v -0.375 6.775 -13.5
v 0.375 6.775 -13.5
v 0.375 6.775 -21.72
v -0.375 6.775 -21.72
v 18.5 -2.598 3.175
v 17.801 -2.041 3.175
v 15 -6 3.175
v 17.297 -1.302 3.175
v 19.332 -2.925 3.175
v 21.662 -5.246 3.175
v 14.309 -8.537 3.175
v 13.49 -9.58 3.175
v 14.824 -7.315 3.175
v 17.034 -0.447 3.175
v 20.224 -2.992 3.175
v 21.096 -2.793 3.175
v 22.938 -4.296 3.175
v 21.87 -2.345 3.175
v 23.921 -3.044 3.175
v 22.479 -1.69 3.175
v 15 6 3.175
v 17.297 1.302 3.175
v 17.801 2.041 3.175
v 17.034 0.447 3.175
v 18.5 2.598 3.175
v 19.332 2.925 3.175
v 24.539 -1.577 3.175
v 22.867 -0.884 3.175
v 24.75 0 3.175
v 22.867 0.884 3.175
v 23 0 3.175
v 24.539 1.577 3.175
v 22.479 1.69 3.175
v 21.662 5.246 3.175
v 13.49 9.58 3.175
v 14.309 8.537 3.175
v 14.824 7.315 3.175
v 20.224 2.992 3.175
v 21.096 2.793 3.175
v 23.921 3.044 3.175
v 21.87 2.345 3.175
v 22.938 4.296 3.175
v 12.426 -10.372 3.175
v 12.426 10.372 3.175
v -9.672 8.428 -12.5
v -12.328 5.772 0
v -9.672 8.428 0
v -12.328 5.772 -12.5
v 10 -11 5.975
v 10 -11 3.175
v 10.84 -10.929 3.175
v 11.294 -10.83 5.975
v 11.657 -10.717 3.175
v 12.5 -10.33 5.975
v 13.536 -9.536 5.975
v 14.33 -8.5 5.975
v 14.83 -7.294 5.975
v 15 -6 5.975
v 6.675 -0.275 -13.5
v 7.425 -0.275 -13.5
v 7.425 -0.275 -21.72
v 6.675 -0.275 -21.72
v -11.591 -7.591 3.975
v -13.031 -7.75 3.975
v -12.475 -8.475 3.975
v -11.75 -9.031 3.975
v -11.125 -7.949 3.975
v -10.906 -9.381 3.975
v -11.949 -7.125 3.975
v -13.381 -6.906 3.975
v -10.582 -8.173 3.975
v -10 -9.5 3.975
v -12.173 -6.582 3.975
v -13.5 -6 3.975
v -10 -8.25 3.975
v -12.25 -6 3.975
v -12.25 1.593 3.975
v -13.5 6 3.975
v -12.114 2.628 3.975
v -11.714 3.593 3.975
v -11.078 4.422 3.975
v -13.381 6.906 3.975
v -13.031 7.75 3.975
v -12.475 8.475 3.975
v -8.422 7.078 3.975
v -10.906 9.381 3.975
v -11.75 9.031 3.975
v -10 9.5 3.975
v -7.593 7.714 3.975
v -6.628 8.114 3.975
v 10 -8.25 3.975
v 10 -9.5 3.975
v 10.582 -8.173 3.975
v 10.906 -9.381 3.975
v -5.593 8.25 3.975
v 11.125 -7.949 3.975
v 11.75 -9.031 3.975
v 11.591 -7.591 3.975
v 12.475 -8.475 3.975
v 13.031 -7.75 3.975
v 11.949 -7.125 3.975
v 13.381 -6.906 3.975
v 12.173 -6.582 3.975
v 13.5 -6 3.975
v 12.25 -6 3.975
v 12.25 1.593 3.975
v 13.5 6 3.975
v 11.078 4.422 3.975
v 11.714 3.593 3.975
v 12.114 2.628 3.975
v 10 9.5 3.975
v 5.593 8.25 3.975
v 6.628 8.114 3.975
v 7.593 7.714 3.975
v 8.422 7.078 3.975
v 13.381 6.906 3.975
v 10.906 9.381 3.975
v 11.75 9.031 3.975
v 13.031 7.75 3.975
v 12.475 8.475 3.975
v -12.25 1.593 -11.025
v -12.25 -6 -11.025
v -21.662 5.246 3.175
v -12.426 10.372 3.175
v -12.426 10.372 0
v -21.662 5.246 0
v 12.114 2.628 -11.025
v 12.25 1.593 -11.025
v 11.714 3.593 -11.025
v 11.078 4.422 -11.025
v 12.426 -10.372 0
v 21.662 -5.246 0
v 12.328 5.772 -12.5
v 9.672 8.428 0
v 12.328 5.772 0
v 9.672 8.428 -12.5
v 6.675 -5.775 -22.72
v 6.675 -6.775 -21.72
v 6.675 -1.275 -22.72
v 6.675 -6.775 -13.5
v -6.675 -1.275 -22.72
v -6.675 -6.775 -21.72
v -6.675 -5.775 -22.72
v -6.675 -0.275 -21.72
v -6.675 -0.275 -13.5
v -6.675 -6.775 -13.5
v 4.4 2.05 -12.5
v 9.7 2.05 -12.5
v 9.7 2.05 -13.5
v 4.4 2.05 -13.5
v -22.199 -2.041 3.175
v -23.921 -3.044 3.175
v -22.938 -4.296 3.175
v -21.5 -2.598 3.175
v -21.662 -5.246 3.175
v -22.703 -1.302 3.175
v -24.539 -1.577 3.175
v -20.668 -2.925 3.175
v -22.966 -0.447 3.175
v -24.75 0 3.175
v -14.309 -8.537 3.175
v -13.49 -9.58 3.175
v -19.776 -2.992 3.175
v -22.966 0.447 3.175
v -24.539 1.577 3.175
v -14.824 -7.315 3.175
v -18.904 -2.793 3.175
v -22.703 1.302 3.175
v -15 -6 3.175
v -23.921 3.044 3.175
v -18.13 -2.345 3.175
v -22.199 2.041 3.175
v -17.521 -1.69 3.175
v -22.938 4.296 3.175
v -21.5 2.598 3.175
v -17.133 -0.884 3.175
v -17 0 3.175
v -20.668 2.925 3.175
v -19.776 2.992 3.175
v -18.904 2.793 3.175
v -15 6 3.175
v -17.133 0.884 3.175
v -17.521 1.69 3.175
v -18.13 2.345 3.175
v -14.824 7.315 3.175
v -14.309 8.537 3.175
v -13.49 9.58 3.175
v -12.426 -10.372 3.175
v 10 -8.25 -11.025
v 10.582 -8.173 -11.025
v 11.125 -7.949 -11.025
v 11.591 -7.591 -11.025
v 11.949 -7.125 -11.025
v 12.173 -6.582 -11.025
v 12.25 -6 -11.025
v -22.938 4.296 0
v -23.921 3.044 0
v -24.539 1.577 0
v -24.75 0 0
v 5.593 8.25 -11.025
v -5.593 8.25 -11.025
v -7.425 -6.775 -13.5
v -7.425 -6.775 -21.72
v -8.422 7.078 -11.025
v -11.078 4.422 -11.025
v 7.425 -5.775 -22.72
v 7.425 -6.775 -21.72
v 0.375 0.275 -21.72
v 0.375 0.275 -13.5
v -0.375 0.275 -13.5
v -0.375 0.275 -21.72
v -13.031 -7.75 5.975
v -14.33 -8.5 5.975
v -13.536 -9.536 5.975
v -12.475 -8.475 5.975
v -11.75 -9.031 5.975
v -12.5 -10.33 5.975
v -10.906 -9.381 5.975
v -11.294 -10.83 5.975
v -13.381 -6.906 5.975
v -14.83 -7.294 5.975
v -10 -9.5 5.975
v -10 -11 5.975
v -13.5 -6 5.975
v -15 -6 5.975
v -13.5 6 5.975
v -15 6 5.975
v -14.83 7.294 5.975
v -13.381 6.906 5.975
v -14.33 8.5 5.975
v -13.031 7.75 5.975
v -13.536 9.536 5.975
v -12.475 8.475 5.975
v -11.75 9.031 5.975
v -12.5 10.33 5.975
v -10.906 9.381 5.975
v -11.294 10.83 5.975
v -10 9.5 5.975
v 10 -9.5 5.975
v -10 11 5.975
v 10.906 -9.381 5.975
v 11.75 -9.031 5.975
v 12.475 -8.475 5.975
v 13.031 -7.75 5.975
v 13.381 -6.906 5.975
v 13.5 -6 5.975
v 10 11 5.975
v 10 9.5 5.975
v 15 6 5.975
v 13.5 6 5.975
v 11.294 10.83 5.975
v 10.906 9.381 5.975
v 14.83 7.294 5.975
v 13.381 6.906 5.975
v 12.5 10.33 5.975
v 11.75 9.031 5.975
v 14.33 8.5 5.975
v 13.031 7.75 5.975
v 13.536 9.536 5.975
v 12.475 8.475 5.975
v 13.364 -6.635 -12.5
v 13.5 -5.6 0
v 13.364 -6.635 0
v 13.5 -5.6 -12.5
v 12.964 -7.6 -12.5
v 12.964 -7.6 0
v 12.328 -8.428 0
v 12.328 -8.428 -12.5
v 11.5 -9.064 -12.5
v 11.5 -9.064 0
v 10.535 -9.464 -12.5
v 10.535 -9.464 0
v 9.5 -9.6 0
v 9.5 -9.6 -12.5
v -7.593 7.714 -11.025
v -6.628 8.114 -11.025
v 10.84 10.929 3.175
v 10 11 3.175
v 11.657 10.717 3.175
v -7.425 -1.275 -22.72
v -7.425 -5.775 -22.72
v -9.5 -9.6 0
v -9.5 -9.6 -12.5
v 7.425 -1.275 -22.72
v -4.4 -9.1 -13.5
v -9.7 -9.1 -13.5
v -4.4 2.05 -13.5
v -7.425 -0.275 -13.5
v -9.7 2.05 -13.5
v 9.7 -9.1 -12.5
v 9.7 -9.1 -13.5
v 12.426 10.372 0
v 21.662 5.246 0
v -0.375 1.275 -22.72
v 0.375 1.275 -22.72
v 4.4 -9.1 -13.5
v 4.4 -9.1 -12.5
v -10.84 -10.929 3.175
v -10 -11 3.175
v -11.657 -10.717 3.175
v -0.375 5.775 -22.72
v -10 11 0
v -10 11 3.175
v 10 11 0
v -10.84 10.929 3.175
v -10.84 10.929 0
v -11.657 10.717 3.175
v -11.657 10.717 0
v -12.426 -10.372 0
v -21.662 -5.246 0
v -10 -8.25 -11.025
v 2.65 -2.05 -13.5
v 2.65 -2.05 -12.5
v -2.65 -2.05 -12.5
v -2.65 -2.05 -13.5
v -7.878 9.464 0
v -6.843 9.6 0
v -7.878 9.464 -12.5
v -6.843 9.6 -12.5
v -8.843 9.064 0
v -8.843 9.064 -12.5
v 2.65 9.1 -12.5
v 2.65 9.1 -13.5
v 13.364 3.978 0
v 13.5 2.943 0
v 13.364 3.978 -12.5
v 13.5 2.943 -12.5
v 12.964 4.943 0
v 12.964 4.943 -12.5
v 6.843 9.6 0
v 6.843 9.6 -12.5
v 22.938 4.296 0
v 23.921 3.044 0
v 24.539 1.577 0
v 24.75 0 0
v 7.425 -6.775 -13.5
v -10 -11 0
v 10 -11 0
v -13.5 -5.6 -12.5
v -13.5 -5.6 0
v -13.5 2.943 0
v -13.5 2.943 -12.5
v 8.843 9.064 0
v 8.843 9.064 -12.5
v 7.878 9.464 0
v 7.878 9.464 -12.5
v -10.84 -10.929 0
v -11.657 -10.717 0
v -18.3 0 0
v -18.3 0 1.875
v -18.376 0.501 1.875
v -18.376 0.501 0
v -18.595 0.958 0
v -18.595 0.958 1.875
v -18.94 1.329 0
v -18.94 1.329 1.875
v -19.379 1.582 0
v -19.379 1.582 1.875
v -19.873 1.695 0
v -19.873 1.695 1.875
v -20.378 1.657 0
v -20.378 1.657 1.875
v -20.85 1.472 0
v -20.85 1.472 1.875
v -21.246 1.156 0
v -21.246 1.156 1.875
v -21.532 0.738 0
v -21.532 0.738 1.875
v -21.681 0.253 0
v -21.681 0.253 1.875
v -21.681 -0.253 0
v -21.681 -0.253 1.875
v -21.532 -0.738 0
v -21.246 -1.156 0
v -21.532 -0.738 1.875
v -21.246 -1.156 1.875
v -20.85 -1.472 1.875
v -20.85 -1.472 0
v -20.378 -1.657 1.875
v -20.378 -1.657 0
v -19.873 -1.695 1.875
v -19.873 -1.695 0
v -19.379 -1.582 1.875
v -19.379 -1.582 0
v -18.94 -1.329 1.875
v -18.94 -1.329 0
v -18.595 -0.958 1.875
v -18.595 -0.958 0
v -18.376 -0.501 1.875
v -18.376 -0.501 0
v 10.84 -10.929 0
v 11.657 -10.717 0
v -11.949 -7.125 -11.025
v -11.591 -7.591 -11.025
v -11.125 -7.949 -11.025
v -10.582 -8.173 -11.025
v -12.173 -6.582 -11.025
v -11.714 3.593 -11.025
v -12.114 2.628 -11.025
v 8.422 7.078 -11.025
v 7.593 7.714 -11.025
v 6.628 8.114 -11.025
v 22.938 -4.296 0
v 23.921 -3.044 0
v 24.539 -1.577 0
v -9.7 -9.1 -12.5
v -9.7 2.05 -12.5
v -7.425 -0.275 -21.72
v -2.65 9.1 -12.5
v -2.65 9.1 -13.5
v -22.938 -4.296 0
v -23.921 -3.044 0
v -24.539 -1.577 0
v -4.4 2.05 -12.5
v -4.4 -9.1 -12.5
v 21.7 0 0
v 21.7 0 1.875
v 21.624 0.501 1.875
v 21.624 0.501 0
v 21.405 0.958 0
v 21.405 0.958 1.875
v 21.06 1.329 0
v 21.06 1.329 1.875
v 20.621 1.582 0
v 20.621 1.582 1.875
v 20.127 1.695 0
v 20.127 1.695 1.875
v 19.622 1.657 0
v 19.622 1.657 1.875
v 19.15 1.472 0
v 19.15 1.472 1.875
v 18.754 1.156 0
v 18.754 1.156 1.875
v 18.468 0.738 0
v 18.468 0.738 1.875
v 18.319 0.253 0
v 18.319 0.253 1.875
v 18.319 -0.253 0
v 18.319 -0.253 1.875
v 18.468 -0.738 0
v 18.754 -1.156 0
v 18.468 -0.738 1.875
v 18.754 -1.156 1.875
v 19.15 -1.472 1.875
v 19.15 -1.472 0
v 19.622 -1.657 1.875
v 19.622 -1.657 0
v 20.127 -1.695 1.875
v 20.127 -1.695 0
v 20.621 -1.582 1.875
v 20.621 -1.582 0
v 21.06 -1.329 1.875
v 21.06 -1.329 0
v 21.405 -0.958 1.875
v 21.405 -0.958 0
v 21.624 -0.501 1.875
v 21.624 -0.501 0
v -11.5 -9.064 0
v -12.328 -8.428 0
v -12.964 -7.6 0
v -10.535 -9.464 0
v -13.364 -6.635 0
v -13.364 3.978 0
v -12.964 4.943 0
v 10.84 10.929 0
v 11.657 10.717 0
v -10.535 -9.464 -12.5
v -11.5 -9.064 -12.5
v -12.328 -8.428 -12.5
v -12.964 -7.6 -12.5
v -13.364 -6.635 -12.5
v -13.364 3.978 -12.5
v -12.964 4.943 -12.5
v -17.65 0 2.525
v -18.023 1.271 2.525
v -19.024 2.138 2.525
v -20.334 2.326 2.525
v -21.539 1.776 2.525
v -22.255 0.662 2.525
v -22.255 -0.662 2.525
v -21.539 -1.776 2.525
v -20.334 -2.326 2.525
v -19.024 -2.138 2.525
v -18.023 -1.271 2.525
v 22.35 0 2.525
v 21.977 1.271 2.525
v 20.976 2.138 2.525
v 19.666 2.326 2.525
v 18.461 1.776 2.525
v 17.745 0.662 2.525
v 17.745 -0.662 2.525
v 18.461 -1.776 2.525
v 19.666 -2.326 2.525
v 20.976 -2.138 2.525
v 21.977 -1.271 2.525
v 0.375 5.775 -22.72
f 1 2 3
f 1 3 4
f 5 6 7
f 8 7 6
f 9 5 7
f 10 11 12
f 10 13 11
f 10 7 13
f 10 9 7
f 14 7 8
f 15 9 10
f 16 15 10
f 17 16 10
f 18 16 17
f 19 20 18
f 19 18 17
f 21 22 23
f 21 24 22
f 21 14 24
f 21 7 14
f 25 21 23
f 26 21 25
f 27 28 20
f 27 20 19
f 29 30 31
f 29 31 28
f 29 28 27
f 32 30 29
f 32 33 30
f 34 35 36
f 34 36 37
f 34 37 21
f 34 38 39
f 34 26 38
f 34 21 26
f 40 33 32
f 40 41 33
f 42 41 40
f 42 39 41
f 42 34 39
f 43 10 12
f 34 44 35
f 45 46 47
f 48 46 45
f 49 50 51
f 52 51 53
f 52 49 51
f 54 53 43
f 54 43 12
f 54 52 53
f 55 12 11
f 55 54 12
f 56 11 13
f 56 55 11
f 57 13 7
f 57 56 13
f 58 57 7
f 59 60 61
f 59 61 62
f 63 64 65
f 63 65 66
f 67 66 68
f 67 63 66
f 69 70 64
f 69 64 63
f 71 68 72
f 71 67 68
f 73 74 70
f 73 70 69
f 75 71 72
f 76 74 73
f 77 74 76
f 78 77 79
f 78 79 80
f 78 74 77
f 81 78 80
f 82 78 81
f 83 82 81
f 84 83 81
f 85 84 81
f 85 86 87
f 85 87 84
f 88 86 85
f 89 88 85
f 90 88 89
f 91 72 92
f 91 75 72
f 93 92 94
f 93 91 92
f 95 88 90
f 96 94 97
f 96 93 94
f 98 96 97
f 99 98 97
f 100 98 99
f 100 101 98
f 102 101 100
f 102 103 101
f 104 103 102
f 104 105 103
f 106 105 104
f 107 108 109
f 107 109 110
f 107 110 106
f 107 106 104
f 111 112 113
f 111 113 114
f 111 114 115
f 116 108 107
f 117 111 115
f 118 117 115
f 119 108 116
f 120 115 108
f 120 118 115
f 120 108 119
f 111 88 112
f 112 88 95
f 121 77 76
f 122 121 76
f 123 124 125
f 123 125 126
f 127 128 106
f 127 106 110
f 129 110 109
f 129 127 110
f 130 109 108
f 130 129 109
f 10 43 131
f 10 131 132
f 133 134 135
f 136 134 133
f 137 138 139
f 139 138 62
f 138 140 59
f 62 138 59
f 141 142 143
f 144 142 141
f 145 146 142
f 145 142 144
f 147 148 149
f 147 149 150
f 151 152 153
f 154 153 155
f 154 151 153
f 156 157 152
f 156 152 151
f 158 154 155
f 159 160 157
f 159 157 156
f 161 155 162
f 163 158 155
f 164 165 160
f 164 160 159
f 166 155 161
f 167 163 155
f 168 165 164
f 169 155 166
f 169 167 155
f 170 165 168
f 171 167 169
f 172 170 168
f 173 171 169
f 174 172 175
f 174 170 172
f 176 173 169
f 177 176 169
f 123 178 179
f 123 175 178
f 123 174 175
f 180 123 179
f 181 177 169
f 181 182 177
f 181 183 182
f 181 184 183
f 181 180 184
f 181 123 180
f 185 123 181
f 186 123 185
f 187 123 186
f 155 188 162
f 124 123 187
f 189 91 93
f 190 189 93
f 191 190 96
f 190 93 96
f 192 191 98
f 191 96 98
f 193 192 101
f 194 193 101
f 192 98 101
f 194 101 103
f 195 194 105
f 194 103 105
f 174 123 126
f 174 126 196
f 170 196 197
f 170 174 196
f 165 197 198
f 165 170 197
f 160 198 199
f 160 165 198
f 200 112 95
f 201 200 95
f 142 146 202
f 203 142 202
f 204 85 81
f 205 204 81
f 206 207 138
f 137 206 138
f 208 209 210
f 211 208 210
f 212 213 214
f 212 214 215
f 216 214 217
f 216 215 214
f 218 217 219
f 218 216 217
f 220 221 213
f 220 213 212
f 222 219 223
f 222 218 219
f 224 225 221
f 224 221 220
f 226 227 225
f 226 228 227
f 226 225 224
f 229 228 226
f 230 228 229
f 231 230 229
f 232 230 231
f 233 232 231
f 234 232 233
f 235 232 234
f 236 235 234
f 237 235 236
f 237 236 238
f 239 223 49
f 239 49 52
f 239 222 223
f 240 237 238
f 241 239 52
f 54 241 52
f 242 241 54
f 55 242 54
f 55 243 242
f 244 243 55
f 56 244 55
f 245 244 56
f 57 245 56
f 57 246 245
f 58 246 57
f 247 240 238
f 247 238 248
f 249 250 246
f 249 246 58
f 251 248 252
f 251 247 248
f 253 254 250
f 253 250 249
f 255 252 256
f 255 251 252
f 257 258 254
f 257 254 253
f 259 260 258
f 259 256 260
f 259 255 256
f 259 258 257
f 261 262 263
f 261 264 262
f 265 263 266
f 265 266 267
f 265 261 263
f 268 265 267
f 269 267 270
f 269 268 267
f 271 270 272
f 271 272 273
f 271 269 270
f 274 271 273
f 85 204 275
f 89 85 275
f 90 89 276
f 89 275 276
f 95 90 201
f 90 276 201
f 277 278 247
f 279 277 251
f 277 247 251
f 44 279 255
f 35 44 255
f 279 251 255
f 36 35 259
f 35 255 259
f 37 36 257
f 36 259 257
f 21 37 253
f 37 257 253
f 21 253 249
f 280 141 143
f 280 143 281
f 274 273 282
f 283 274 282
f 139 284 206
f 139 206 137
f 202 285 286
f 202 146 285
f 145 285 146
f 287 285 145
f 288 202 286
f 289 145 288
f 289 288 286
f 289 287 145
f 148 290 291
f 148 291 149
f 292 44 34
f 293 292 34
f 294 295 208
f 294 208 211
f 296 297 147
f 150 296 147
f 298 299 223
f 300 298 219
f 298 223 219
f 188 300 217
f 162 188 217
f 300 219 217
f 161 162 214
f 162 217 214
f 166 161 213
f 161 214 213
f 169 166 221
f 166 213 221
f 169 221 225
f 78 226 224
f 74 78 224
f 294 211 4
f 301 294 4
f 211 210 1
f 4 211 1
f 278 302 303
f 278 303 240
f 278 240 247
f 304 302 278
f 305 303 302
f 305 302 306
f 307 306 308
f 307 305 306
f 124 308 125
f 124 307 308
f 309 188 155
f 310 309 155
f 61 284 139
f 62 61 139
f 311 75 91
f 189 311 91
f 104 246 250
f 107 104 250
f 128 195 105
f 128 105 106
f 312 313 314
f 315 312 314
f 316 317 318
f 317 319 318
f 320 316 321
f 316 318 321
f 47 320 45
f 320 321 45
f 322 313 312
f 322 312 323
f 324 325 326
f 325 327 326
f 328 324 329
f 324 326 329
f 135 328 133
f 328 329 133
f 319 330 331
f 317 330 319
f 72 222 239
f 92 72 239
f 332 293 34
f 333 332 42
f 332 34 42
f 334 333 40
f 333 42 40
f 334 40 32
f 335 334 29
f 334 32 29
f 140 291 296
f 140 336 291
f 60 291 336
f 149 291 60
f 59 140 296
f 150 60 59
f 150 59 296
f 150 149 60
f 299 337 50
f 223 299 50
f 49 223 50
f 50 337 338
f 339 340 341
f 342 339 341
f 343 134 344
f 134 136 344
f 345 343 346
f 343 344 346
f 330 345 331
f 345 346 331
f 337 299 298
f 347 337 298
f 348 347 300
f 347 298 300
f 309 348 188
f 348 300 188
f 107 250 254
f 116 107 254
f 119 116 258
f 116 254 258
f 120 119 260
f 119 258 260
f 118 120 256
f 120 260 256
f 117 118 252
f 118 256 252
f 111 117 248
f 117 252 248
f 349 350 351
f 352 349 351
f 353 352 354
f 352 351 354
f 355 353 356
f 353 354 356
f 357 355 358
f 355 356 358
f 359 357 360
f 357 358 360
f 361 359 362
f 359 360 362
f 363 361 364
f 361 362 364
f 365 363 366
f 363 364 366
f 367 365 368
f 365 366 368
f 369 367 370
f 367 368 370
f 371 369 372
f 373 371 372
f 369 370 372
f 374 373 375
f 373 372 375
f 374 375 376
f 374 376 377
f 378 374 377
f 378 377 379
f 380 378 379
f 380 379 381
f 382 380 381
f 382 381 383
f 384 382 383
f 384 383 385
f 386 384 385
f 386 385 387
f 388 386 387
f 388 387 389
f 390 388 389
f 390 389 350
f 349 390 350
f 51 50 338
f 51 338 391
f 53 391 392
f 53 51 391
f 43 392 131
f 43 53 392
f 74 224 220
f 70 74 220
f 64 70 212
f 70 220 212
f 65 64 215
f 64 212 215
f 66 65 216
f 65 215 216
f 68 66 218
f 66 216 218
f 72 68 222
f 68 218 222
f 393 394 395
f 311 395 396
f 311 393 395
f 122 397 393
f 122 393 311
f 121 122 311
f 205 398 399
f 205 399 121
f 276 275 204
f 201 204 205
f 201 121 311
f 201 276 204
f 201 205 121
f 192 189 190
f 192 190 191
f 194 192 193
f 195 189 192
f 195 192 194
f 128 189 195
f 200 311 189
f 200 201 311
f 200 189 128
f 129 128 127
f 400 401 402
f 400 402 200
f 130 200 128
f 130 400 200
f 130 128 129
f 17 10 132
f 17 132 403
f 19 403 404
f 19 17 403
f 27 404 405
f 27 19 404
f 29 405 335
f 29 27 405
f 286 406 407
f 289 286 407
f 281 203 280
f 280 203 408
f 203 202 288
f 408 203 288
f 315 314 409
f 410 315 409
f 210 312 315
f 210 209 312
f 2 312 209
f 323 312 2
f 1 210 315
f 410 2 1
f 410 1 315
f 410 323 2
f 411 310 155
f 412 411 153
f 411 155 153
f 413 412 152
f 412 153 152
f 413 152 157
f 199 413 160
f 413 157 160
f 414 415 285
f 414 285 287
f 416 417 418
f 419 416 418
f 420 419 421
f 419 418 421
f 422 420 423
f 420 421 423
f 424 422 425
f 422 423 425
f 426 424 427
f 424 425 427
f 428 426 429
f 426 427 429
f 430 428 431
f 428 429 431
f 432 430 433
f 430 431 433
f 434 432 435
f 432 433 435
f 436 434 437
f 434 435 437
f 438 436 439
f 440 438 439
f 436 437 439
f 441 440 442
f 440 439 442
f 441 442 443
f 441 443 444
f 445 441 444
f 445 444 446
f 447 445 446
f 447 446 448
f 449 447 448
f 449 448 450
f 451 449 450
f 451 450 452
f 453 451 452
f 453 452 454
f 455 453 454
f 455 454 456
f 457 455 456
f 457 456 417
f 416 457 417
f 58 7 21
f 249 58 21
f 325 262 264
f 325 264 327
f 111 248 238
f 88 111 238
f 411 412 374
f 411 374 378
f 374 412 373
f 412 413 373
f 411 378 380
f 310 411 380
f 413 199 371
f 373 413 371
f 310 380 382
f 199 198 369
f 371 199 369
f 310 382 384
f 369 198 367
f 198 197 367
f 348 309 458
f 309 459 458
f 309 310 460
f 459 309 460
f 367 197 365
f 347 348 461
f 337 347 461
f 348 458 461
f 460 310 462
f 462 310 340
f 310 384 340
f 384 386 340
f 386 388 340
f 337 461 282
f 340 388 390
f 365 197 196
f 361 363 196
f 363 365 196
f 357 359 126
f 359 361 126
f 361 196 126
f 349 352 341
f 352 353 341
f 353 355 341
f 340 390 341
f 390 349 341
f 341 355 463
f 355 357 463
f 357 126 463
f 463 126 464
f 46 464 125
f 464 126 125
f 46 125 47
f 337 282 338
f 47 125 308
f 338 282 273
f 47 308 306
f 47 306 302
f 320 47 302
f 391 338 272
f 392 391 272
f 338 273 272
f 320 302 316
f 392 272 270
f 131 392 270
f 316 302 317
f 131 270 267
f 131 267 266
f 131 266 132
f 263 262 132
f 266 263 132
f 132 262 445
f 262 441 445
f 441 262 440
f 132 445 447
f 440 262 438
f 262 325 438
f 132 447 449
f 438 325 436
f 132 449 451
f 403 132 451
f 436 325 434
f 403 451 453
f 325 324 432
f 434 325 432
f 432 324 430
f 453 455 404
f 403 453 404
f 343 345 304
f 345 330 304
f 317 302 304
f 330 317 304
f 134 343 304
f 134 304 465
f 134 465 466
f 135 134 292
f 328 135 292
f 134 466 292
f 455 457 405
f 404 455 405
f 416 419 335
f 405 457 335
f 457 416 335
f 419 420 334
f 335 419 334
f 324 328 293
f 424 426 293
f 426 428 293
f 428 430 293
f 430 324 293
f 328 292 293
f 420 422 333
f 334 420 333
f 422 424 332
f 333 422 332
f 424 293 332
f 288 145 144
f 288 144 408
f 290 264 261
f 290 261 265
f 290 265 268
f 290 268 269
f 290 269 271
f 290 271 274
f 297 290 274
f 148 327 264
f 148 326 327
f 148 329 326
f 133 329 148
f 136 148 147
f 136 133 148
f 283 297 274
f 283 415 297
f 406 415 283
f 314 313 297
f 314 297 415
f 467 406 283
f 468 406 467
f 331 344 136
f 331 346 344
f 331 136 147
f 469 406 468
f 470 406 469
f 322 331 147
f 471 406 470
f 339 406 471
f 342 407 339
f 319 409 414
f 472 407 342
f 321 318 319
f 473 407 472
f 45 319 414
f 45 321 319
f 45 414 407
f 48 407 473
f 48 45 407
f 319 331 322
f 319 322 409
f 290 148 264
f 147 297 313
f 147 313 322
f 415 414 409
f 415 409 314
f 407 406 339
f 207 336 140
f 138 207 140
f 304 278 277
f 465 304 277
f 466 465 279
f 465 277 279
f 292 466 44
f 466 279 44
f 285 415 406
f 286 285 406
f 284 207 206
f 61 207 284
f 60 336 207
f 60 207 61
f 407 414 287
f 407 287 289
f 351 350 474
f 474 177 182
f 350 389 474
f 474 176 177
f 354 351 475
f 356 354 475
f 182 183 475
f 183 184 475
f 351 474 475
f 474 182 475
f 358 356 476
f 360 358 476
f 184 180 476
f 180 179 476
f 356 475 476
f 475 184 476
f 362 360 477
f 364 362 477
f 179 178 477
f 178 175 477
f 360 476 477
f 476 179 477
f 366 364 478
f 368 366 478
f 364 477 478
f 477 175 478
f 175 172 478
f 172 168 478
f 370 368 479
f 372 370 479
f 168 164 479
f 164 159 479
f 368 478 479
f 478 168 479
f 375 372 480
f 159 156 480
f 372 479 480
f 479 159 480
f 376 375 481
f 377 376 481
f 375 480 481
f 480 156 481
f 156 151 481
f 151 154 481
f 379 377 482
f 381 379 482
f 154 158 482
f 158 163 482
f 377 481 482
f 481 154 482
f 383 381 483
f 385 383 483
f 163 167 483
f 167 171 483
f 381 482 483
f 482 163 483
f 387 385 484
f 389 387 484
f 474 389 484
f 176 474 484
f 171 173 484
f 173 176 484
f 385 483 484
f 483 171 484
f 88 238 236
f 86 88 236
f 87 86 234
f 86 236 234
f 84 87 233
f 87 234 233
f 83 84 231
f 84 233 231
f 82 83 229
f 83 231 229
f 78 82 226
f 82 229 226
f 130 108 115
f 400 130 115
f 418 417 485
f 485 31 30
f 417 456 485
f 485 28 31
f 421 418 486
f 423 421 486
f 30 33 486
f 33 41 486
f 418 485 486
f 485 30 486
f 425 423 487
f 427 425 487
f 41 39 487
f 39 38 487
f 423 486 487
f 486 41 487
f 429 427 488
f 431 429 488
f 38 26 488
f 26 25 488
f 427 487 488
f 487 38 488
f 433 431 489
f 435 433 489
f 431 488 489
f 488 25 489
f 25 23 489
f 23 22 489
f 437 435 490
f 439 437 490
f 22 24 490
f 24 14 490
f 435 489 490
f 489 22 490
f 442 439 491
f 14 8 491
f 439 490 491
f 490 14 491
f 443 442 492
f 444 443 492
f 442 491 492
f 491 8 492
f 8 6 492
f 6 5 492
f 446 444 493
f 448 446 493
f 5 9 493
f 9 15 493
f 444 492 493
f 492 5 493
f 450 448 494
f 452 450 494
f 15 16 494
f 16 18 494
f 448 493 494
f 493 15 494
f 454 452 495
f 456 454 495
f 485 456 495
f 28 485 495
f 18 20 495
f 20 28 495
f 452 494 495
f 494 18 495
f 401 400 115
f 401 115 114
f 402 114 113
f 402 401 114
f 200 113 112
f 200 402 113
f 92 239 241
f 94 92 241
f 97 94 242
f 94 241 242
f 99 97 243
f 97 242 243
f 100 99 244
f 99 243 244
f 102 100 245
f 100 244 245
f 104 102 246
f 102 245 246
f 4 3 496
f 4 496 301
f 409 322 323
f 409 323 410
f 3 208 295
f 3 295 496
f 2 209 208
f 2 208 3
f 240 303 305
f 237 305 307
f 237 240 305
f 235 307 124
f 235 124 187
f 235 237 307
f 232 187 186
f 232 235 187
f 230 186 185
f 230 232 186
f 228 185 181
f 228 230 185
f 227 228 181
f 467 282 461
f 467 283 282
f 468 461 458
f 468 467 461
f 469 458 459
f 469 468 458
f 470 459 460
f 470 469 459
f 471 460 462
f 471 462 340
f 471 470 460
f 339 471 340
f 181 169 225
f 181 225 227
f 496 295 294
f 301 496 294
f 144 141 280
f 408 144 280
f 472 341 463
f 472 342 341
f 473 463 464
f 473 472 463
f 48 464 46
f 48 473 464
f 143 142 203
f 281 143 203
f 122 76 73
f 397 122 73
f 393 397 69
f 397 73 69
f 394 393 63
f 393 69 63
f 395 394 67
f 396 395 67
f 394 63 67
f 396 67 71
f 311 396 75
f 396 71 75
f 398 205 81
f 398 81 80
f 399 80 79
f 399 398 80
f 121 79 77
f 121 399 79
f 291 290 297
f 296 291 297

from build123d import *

# Parameters (mm, degrees)
SKETCH1_W            = 49.5
SKETCH1_H            = 22
BOSS_EXTRUDE1_DEPTH  = 3.175
SKETCH2_W            = 30
SKETCH2_H            = 22
BOSS_EXTRUDE2_DEPTH  = 2.8
FILLET1_R            = 5
SKETCH4_W            = 27
SKETCH4_H            = 19.2
BOSS_EXTRUDE3_DEPTH  = 12.5
CHAMFER1_SIZE        = 5
FILLET2_R            = 4
SKETCH3_R            = 1.7
CUT_EXTRUDE1_DEPTH   = 16.675
CUT_EXTRUDE2_DEPTH   = 16.2
MIRROR2_COPY_1_DEPTH = 16.2
CHAMFER2_SIZE        = 1.3
CUT_EXTRUDE4_DEPTH   = 17
FILLET3_R            = 4
SKETCH9_W            = 5.3
SKETCH9_H            = 11.15
BOSS_EXTRUDE4_DEPTH  = 1
SKETCH10_W           = 0.75
SKETCH10_H           = 6.5
BOSS_EXTRUDE5_DEPTH  = 9.22
CHAMFER3_SIZE        = 1
CUT_EXTRUDE3_DEPTH   = 2


with BuildPart() as part:
    # Sketch1 → Boss-Extrude1 (new body)
    with BuildSketch(Plane.XY):
        Rectangle(SKETCH1_W, SKETCH1_H)
    extrude(amount=BOSS_EXTRUDE1_DEPTH)

    # Sketch2 → Boss-Extrude2 (add)
    with BuildSketch(Plane.XY.offset(3.175)):
        Rectangle(SKETCH2_W, SKETCH2_H)
    extrude(amount=BOSS_EXTRUDE2_DEPTH)

    # Fillet1
    fillet1_edges = [part.edges().sort_by_distance(p)[0] for p in [
        (-15, 11, 4.575),
        (15, 11, 4.575),
        (15, -11, 4.575),
        (-15, -11, 4.575),
    ]]
    fillet(fillet1_edges, radius=FILLET1_R)

    # Sketch4 → Boss-Extrude3 (add)
    with BuildSketch(Plane(origin=(0, 0, 0), x_dir=(-1, 0, 0), z_dir=(0, 0, -1))):
        Rectangle(SKETCH4_W, SKETCH4_H)
    extrude(amount=BOSS_EXTRUDE3_DEPTH)

    # Chamfer1
    chamfer1_edges = [part.edges().sort_by_distance(p)[0] for p in [
        (13.5, 9.6, -6.25),
        (-13.5, 9.6, -6.25),
    ]]
    chamfer(chamfer1_edges, length=CHAMFER1_SIZE)

    # Fillet2
    fillet2_edges = [part.edges().sort_by_distance(p)[0] for p in [
        (13.5, -9.6, -6.25),
        (-13.5, -9.6, -6.25),
        (8.5, 9.6, -6.25),
        (-8.5, 9.6, -6.25),
        (-13.5, 4.6, -6.25),
        (13.5, 4.6, -6.25),
    ]]
    fillet(fillet2_edges, radius=FILLET2_R)

    # Sketch3 → Cut-Extrude1 (cut, through all)
    with BuildSketch(Plane.XY.offset(3.175)):
        with Locations((-20, 0)):
            Circle(SKETCH3_R)
        with Locations((20, 0)):
            Circle(SKETCH3_R)
    extrude(amount=-CUT_EXTRUDE1_DEPTH, mode=Mode.SUBTRACT)

    # Sketch5 → Cut-Extrude2 (cut)
    with BuildSketch(Plane.XY.offset(3.175)):
        with BuildLine():
            Line((-12.426380479, 10.371804865), (-21.661656574, 5.246165837))
            ThreePointArc((-21.661656574, 5.246165837), (-23.92058698, 3.043851225), (-24.75, 0))
            Line((-24.75, 0), (-24.75, 11))
            Line((-24.75, 11), (-10, 11))
            ThreePointArc((-10, 11), (-11.253191062, 10.840404132), (-12.426380479, 10.371804865))
        make_face()
    cut_extrude2 = extrude(amount=-CUT_EXTRUDE2_DEPTH, mode=Mode.SUBTRACT)

    # Mirror1: Cut-Extrude2 across plane
    add(cut_extrude2.mirror(Plane.ZX), mode=Mode.SUBTRACT)

    # Mirror2: Cut-Extrude2 across plane
    add(cut_extrude2.mirror(Plane(origin=(0, 0, 0), x_dir=(0, 0, 1), z_dir=(1, 0, 0))), mode=Mode.SUBTRACT)

    # Mirror2 copy 1 sketch → Mirror2 copy 1 (cut)
    with BuildSketch(Plane(origin=(0, 0, 3.175), x_dir=(-1, 0, 0), z_dir=(0, 0, 1))):
        with BuildLine():
            Line((-12.426380479, 10.371804865), (-21.661656574, 5.246165837))
            ThreePointArc((-21.661656574, 5.246165837), (-23.92058698, 3.043851225), (-24.75, 0))
            Line((-24.75, 0), (-24.75, 11))
            Line((-24.75, 11), (-10, 11))
            ThreePointArc((-10, 11), (-11.253191062, 10.840404132), (-12.426380479, 10.371804865))
        make_face()
    extrude(amount=-MIRROR2_COPY_1_DEPTH, mode=Mode.SUBTRACT)

    # Chamfer2
    chamfer2_edges = [part.edges().sort_by_distance(p)[0] for p in [
        (-21.7, 0, 3.175),
        (18.3, 0, 3.175),
    ]]
    chamfer(chamfer2_edges, length=CHAMFER2_SIZE)

    # Sketch8 → Cut-Extrude4 (cut)
    with BuildSketch(Plane.XY.offset(5.975)):
        with BuildLine():
            Line((-7.25, 8.25), (-12.25, 3.25))
            Line((-12.25, 3.25), (-12.25, -6))
            ThreePointArc((-12.25, -6), (-11.590990258, -7.590990258), (-10, -8.25))
            Line((-10, -8.25), (10, -8.25))
            ThreePointArc((10, -8.25), (11.590990258, -7.590990258), (12.25, -6))
            Line((12.25, -6), (12.25, 3.25))
            Line((12.25, 3.25), (7.25, 8.25))
            Line((7.25, 8.25), (-7.25, 8.25))
        make_face()
    extrude(amount=-CUT_EXTRUDE4_DEPTH, mode=Mode.SUBTRACT)

    # Fillet3
    fillet3_edges = [part.edges().sort_by_distance(p)[0] for p in [
        (-7.25, 8.25, -2.525),
        (7.25, 8.25, -2.525),
        (12.25, 3.25, -2.525),
        (-12.25, 3.25, -2.525),
    ]]
    fillet(fillet3_edges, radius=FILLET3_R)

    # Sketch9 → Boss-Extrude4 (add)
    with BuildSketch(Plane(origin=(0, 0, -12.5), x_dir=(-1, 0, 0), z_dir=(0, 0, -1))):
        with Locations((0, 3.525)):
            Rectangle(SKETCH9_W, SKETCH9_H)
        with Locations((-7.05, -3.525)):
            Rectangle(SKETCH9_W, SKETCH9_H)
        with Locations((7.05, -3.525)):
            Rectangle(SKETCH9_W, SKETCH9_H)
    extrude(amount=BOSS_EXTRUDE4_DEPTH)

    # Sketch10 → Boss-Extrude5 (add)
    with BuildSketch(Plane(origin=(0, 0, -13.5), x_dir=(-1, 0, 0), z_dir=(0, 0, -1))):
        with Locations((0, 3.525)):
            Rectangle(SKETCH10_W, SKETCH10_H)
        with Locations((-7.05, -3.525)):
            Rectangle(SKETCH10_W, SKETCH10_H)
        with Locations((7.05, -3.525)):
            Rectangle(SKETCH10_W, SKETCH10_H)
    extrude(amount=BOSS_EXTRUDE5_DEPTH)

    # Chamfer3
    chamfer3_edges = [part.edges().sort_by_distance(p)[0] for p in [
        (0, 0.275, -22.72),
        (0, 6.775, -22.72),
        (7.05, -6.775, -22.72),
        (7.05, -0.275, -22.72),
        (-7.05, -6.775, -22.72),
        (-7.05, -0.275, -22.72),
    ]]
    chamfer(chamfer3_edges, length=CHAMFER3_SIZE)

    # Sketch6 → Cut-Extrude3 (cut)
    with BuildSketch(Plane.XY.offset(5.975)):
        with BuildLine():
            Line((-13.5, 6), (-13.5, -6))
            ThreePointArc((-13.5, -6), (-12.474873734, -8.474873734), (-10, -9.5))
            Line((-10, -9.5), (10, -9.5))
            ThreePointArc((10, -9.5), (12.474873734, -8.474873734), (13.5, -6))
            Line((13.5, -6), (13.5, 6))
            ThreePointArc((13.5, 6), (12.474873734, 8.474873734), (10, 9.5))
            Line((10, 9.5), (-10, 9.5))
            ThreePointArc((-10, 9.5), (-12.474873734, 8.474873734), (-13.5, 6))
        make_face()
    extrude(amount=-CUT_EXTRUDE3_DEPTH, mode=Mode.SUBTRACT)


solid = part.part
